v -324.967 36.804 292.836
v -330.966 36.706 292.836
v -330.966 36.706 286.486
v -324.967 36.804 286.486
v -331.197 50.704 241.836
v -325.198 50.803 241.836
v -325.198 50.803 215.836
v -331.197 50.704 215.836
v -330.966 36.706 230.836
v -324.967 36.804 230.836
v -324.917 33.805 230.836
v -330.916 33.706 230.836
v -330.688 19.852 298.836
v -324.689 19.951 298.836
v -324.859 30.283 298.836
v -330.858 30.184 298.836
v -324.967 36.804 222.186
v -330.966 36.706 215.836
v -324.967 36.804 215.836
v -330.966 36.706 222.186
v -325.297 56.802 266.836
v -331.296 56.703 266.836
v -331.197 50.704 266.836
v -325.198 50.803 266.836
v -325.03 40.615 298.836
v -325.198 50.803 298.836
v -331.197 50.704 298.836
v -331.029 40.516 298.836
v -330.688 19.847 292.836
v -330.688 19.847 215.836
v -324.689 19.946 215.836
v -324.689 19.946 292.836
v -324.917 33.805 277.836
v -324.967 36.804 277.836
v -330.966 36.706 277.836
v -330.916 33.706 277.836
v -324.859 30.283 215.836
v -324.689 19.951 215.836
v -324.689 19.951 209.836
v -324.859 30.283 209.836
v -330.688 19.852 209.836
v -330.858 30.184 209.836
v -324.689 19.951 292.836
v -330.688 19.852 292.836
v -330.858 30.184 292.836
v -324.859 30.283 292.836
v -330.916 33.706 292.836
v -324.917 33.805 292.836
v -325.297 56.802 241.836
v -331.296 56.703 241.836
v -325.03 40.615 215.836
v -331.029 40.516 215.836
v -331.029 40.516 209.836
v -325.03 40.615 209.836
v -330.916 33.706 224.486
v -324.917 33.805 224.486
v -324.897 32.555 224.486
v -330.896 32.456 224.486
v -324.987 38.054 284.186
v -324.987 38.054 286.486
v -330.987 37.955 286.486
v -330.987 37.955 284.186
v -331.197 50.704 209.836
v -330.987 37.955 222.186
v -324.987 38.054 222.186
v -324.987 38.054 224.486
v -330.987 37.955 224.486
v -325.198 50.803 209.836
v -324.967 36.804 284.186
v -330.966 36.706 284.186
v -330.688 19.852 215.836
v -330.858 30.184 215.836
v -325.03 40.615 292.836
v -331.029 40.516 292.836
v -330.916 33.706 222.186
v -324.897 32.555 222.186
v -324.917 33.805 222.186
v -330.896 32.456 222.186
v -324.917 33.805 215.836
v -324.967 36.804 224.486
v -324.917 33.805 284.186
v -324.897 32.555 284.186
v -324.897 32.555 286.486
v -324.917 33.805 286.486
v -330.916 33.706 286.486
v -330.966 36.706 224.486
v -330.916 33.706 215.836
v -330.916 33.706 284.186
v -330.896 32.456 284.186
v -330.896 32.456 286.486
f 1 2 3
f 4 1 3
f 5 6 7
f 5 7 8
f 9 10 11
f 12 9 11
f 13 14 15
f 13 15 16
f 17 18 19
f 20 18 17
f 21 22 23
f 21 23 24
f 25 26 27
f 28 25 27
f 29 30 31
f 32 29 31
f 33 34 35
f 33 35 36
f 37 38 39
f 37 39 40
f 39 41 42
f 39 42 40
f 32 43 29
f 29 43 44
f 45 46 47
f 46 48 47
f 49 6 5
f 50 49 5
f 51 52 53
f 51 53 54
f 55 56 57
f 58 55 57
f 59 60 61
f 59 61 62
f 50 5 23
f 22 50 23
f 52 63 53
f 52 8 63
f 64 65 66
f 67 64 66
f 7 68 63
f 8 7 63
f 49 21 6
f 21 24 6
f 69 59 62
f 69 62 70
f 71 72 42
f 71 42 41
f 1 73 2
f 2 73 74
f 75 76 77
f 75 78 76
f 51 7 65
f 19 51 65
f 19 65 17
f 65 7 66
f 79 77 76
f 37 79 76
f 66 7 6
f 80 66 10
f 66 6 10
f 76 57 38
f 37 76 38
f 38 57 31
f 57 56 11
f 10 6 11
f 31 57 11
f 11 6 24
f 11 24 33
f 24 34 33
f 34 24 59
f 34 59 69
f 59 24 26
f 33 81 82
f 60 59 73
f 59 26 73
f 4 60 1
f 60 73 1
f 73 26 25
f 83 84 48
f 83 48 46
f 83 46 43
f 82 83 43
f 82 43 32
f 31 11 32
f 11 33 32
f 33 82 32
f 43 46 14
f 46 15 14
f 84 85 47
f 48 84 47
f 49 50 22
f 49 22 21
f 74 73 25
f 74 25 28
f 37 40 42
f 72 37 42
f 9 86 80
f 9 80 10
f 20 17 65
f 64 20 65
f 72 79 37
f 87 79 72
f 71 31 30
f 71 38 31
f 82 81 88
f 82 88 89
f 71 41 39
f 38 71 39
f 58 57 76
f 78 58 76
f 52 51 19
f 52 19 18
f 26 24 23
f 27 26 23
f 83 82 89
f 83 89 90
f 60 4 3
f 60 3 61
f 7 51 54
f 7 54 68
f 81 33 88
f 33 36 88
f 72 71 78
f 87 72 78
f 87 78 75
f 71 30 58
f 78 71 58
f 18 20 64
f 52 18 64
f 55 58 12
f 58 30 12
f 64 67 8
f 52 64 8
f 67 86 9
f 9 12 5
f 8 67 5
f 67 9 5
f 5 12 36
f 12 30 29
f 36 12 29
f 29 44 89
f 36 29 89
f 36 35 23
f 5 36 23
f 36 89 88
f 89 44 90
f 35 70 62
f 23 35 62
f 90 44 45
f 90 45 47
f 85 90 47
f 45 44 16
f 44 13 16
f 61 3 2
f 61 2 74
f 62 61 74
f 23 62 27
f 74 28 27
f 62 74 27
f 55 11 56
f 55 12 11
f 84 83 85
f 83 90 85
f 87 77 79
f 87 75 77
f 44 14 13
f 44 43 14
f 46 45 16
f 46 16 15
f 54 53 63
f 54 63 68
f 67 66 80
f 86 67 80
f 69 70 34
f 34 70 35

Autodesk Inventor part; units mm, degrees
ref_plane "РабПлоскость1" through (-327.803629, 8.784154, 215.836479) normal (0, 0, 1) x (1, 0, 0)
sketch "Эскиз1" plane through (-327.803629, 8.784154, 215.836479) normal (0, 0, 1) x (1, 0, 0)
  line L0 (3.114831, 11.166777) -> (2.944416, 21.498705)
  line L1 (2.944416, 21.498705) -> (-3.054768, 21.399754)
  line L2 (-3.054768, 21.399754) -> (-2.884353, 11.067826)
  line L3 (-2.884353, 11.067826) -> (3.114831, 11.166777)
  line L4 (-3.393221, 41.919489) -> (-3.225183, 31.731682)
  line L5 (2.774001, 31.830633) -> (2.605963, 42.01844)
  line L6 (-3.225183, 31.731682) -> (2.774001, 31.830633)
  line L7 (2.605963, 42.01844) -> (-3.393221, 41.919489)
  line L8 (2.774001, 31.830633) -> (2.605963, 42.01844) construction
  line L9 (-3.393221, 41.919489) -> (-3.225183, 31.731682) construction
  line L10 (3.114831, 11.166777) -> (2.944416, 21.498705) construction
  line L11 (-3.054768, 21.399754) -> (-2.884353, 11.067826) construction
  line L12 (6.149374, 48.077701) -> (19.433282, 48.296806) construction
  line L13 (2.605963, 42.01844) -> (6.248325, 42.078517) construction
  point P0 (327.803629, -8.784154)
  dimension "d16" = 6
extrude "Выдавливание1" add sketch "Эскиз1" against normal blind 6
ref_plane "РабПлоскость2" through (-327.498735, 8.403036, 292.836479) normal (0, 0, -1) x (-0.999864, -0.0164918, 0)
sketch "Эскиз2" plane through (-327.498735, 8.403036, 292.836479) normal (0, 0, -1) x (-0.999864, -0.0164918, 0)
  line L0 (-3, 21.833317) -> (3, 21.833317)
  line L1 (3, 21.833317) -> (3, 11.499984)
  line L2 (3, 11.5) -> (-3, 11.5)
  line L3 (-3, 11.499984) -> (-3, 21.833317)
  line L4 (3, 32.16665) -> (-3, 32.16665)
  line L5 (-3, 32.16665) -> (-3, 42.355843)
  line L6 (-3, 42.5) -> (3, 42.5)
  line L7 (3, 42.355843) -> (3, 32.16665)
  line L8 (-3, 11.499984) -> (-3, 21.833317) construction
  line L9 (3, 21.833317) -> (3, 11.499984) construction
  line L10 (-3, 32.16665) -> (-3, 42.355843) construction
  line L11 (3, 42.355843) -> (3, 32.16665) construction
  point P0 (-327.315615, -13.802923)
sketch "Эскиз2 outline for Выдавливание2" plane through (-327.498735, 8.403036, 292.836479) normal (0, 0, -1) x (-0.999864, -0.0164918, 0)
  line L0 (3, 32.16665) -> (3, 42.355843)
  line L1 (-3, 32.16665) -> (3, 32.16665)
  line L2 (-3, 42.355843) -> (-3, 32.16665)
  line L3 (3, 42.355843) -> (-3, 42.355843)
  line L4 (-3, 21.833317) -> (-3, 11.499984)
  line L5 (3, 21.833317) -> (-3, 21.833317)
  line L6 (3, 11.499984) -> (3, 21.833317)
  line L7 (-3, 11.499984) -> (3, 11.499984)
extrude "Выдавливание2" add sketch "Эскиз2 outline for Выдавливание2" against normal blind 6
sketch "Эскиз3" plane through (-327.498735, 8.403036, 292.836479) normal (0, 0, -1) x (-0.999864, -0.0164918, 0)
  line L0 (6.642857, 42.355843) -> (3, 42.355843)
  line L1 (-3, 32.166667) -> (-3, 21.833333)
  line L2 (-3, 21.833333) -> (3, 21.833333)
  line L3 (3, 21.833333) -> (3, 32.166667)
  line L4 (3, 32.166667) -> (-3, 32.166667)
  line L5 (-3, 42.355843) -> (3, 42.355843)
  line L6 (3, 42.355843) -> (3, 11.495073)
  line L7 (3, 11.495073) -> (-3, 11.495073)
  line L8 (-3, 11.495073) -> (-3, 42.355843)
  point P0 (-327.315615, -13.802923)
  point P1 (-3, 21.833333)
  point P2 (3, 21.833333)
  point P3 (3, 42.355843)
extrude "Выдавливание3" add sketch "Эскиз3" along normal up to surface (77 mm away)
sketch "Эскиз4" plane through (-331.19685, 50.703643, 209.836479) normal (-0.999864, -0.0164918, 0) x (0, 0, 1)
  line L0 (0, -14) -> (6, -14) construction
  line L1 (0, -17) -> (6, -17) construction
  line L2 (6, -17) -> (6, -14)
  line L3 (6, -14) -> (12.35, -14)
  line L4 (12.35, -14) -> (12.35, -12.75)
  line L5 (12.35, -12.75) -> (14.65, -12.75)
  line L6 (14.65, -12.75) -> (14.65, -14)
  line L7 (14.65, -14) -> (21, -14)
  line L8 (21, -14) -> (21, -17)
  line L9 (21, -17) -> (14.65, -17)
  line L10 (14.65, -17) -> (14.65, -18.25)
  line L11 (14.65, -18.25) -> (12.35, -18.25)
  line L12 (12.35, -18.25) -> (12.35, -17)
  line L13 (12.35, -17) -> (6, -17)
  line L14 (0, -20.522506) -> (0, -30.855843) construction
  line L15 (89, -10.189193) -> (89, 0) construction
  line L16 (0, -30.855843) -> (89, 0) construction
  line L17 (44.5, 0) -> (44.5, -30.855843) construction
  line L18 (89, -14) -> (83, -14) construction
  line L19 (89, -17) -> (83, -17) construction
  line L20 (83, -17) -> (83, -14)
  line L21 (83, -14) -> (76.65, -14)
  line L22 (76.65, -14) -> (76.65, -12.75)
  line L23 (76.65, -12.75) -> (74.35, -12.75)
  line L24 (74.35, -12.75) -> (74.35, -14)
  line L25 (74.35, -14) -> (68, -14)
  line L26 (68, -14) -> (68, -17)
  line L27 (68, -17) -> (74.35, -17)
  line L28 (74.35, -17) -> (74.35, -18.25)
  line L29 (74.35, -18.25) -> (76.65, -18.25)
  line L30 (76.65, -18.25) -> (76.65, -17)
  line L31 (76.65, -17) -> (83, -17)
  point P0 (-209.836479, -56.158766)
  point P1 (44.5, -15.427922)
  dimension "d9" = 2.3
  dimension "d10" = 5.5
  dimension "d11" = 15
extrude "Выдавливание4" cut sketch "Эскиз4" against normal blind 6
ref_plane "РабПлоскость3" through (-672.954973, 50.067364, -86.377936) normal (-0.0164918, 0.999864, 0) x (0, 0, 1)
sketch "Эскиз6" plane through (-325.197666, 50.802594, 298.836479) normal (-0.0164918, 0.999864, 0) x (0.999864, 0.0164918, 0)
  line L0 (-6, 89) -> (-6, 0) construction
  line L1 (0, 0) -> (0, 89) construction
  line L2 (-6, 32) -> (0, 32)
  line L3 (0, 32) -> (0, 57)
  line L4 (0, 57) -> (-6, 57)
  line L5 (-6, 57) -> (-6, 32)
  line L6 (0, 89) -> (-6, 89) projected
  line L7 (-3, 89) -> (-3, 57) construction
  line L8 (-3, 32) -> (-3, 0) construction
  line L9 (0, 0) -> (-6, 0) projected
  point P0 (324.315615, 298.836479)
  dimension "d17" = 25
extrude "Выдавливание6" add sketch "Эскиз6" along normal blind 6
equation "\"d1\" = d0"
equation "\"d3\" = d0"
equation "\"d7\" = d0"
equation "\"d12\" = d3"
equation "\"d0\" = d16"
properties part number "motor1"
